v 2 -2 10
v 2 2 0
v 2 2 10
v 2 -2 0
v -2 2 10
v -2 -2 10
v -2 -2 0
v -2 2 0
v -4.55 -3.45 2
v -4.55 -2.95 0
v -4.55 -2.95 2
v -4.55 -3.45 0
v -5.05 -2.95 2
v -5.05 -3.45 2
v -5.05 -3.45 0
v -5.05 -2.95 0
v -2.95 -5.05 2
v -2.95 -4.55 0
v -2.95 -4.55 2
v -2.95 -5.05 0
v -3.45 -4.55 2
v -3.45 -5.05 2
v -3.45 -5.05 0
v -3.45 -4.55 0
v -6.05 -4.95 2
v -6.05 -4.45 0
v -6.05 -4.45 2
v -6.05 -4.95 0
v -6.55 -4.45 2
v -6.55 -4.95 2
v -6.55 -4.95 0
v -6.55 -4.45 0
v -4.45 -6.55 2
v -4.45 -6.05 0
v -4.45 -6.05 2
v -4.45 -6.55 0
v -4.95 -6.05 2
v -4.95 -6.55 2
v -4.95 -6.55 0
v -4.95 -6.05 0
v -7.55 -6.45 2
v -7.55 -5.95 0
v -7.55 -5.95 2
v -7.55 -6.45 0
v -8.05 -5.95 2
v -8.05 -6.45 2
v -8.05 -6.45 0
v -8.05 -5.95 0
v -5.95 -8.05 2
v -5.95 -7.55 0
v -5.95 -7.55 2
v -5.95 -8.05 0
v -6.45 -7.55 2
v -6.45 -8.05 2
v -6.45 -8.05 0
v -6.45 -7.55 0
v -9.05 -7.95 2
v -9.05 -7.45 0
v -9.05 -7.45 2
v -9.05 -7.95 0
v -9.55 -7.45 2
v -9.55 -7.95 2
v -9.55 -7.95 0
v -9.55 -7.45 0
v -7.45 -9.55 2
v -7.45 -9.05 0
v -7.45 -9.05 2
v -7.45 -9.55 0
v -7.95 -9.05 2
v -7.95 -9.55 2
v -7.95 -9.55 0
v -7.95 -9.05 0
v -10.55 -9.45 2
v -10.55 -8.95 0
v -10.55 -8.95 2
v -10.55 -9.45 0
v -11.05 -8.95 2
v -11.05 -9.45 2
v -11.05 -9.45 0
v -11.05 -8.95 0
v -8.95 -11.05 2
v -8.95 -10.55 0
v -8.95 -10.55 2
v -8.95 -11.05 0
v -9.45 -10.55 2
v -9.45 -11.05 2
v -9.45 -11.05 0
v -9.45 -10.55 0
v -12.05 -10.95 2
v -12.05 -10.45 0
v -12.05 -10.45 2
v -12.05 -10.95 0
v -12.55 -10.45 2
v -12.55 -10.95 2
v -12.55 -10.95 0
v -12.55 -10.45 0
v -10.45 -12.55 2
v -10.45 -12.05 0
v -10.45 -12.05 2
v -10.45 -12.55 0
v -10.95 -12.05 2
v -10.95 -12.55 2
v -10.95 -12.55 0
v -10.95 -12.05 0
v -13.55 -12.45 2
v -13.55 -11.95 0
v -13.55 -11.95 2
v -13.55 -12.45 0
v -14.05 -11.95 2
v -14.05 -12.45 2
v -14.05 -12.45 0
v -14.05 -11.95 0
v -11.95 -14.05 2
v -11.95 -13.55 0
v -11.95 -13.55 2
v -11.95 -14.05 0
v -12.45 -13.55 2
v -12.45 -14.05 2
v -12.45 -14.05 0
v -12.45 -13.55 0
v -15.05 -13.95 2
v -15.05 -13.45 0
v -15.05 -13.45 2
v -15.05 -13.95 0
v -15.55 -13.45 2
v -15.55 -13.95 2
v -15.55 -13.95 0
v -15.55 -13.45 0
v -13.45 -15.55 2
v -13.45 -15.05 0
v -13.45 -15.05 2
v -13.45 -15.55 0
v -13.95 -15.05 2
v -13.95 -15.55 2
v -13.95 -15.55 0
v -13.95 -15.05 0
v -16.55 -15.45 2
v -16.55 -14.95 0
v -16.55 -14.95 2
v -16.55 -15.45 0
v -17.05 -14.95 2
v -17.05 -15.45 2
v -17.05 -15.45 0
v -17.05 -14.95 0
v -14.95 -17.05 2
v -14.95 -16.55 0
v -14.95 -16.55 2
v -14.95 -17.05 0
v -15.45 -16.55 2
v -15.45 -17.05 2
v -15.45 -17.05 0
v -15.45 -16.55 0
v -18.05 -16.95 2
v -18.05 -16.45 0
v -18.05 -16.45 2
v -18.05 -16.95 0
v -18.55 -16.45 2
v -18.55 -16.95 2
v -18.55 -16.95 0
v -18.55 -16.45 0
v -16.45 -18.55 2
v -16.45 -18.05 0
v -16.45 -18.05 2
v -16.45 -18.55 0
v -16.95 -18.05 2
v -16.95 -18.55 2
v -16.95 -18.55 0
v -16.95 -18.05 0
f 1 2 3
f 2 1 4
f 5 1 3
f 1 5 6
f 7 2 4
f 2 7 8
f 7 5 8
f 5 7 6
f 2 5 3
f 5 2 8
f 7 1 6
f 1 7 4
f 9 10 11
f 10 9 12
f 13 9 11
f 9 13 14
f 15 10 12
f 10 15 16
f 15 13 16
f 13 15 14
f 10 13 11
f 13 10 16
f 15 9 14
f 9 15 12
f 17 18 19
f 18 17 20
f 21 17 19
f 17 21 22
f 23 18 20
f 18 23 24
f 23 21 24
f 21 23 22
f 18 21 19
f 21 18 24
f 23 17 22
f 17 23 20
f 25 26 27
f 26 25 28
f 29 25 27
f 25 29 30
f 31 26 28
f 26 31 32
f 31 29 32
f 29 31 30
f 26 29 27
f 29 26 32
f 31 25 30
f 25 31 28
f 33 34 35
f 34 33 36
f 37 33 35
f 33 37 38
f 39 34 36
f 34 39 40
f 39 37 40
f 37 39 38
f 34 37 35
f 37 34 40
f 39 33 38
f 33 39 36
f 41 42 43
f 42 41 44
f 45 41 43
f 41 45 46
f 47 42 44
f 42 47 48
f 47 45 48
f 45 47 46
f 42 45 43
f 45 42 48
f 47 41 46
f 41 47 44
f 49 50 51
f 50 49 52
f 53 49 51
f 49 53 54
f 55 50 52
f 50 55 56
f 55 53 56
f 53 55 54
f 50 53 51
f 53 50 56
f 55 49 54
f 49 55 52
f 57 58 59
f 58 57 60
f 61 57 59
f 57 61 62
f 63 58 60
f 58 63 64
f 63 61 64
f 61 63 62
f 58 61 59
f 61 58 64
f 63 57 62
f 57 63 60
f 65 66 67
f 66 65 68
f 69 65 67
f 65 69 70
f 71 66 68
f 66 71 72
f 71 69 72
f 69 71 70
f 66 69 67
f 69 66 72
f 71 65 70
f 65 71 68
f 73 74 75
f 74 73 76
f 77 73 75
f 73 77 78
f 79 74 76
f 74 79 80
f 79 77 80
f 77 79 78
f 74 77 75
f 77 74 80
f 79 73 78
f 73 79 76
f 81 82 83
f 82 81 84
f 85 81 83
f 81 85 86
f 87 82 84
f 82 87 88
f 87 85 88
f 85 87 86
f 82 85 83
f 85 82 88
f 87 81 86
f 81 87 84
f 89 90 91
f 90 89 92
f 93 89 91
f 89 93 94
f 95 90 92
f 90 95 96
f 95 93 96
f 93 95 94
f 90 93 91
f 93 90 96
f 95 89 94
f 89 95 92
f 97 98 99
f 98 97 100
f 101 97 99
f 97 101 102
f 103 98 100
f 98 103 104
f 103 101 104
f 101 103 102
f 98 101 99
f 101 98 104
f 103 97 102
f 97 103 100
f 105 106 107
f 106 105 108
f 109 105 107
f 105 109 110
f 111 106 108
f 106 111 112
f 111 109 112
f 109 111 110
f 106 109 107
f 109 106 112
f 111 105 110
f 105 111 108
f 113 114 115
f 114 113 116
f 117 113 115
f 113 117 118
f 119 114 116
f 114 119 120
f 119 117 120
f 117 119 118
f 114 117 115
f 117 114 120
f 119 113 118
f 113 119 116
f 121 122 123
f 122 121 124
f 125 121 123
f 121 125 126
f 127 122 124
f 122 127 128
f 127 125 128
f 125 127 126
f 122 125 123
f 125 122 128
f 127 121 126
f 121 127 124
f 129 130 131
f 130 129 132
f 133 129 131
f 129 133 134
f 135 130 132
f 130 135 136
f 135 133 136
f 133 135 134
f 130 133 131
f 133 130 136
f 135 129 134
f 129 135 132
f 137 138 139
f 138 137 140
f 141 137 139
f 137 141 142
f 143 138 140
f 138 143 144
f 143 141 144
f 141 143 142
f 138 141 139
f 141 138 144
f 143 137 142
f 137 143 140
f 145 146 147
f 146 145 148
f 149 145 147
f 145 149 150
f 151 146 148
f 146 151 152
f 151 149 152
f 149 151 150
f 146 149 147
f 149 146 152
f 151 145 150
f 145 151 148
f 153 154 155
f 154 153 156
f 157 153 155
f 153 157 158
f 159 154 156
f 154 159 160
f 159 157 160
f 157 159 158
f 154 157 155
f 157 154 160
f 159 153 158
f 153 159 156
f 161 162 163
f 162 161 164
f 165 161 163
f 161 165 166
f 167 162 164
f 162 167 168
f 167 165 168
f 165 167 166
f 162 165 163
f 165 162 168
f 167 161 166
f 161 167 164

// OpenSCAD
translate([0, 0, 5]) color([0,1,0,0.9]) cube([4, 4, 10], center=true);
translate([-4.8, -3.2, 1]) color([1,0,0]) cube([0.5, 0.5, 2], center=true);
translate([-3.2, -4.8, 1]) color([1,0,0]) cube([0.5, 0.5, 2], center=true);
translate([-6.3, -4.7, 1]) color([1,0,0]) cube([0.5, 0.5, 2], center=true);
translate([-4.7, -6.3, 1]) color([1,0,0]) cube([0.5, 0.5, 2], center=true);
translate([-7.8, -6.2, 1]) color([1,0,0]) cube([0.5, 0.5, 2], center=true);
translate([-6.2, -7.8, 1]) color([1,0,0]) cube([0.5, 0.5, 2], center=true);
translate([-9.3, -7.7, 1]) color([1,0,0]) cube([0.5, 0.5, 2], center=true);
translate([-7.7, -9.3, 1]) color([1,0,0]) cube([0.5, 0.5, 2], center=true);
translate([-10.8, -9.2, 1]) color([1,0,0]) cube([0.5, 0.5, 2], center=true);
translate([-9.2, -10.8, 1]) color([1,0,0]) cube([0.5, 0.5, 2], center=true);
translate([-12.3, -10.7, 1]) color([1,0,0]) cube([0.5, 0.5, 2], center=true);
translate([-10.7, -12.3, 1]) color([1,0,0]) cube([0.5, 0.5, 2], center=true);
translate([-13.8, -12.2, 1]) color([1,0,0]) cube([0.5, 0.5, 2], center=true);
translate([-12.2, -13.8, 1]) color([1,0,0]) cube([0.5, 0.5, 2], center=true);
translate([-15.3, -13.7, 1]) color([1,0,0]) cube([0.5, 0.5, 2], center=true);
translate([-13.7, -15.3, 1]) color([1,0,0]) cube([0.5, 0.5, 2], center=true);
translate([-16.8, -15.2, 1]) color([1,0,0]) cube([0.5, 0.5, 2], center=true);
translate([-15.2, -16.8, 1]) color([1,0,0]) cube([0.5, 0.5, 2], center=true);
translate([-18.3, -16.7, 1]) color([1,0,0]) cube([0.5, 0.5, 2], center=true);
translate([-16.7, -18.3, 1]) color([1,0,0]) cube([0.5, 0.5, 2], center=true);
